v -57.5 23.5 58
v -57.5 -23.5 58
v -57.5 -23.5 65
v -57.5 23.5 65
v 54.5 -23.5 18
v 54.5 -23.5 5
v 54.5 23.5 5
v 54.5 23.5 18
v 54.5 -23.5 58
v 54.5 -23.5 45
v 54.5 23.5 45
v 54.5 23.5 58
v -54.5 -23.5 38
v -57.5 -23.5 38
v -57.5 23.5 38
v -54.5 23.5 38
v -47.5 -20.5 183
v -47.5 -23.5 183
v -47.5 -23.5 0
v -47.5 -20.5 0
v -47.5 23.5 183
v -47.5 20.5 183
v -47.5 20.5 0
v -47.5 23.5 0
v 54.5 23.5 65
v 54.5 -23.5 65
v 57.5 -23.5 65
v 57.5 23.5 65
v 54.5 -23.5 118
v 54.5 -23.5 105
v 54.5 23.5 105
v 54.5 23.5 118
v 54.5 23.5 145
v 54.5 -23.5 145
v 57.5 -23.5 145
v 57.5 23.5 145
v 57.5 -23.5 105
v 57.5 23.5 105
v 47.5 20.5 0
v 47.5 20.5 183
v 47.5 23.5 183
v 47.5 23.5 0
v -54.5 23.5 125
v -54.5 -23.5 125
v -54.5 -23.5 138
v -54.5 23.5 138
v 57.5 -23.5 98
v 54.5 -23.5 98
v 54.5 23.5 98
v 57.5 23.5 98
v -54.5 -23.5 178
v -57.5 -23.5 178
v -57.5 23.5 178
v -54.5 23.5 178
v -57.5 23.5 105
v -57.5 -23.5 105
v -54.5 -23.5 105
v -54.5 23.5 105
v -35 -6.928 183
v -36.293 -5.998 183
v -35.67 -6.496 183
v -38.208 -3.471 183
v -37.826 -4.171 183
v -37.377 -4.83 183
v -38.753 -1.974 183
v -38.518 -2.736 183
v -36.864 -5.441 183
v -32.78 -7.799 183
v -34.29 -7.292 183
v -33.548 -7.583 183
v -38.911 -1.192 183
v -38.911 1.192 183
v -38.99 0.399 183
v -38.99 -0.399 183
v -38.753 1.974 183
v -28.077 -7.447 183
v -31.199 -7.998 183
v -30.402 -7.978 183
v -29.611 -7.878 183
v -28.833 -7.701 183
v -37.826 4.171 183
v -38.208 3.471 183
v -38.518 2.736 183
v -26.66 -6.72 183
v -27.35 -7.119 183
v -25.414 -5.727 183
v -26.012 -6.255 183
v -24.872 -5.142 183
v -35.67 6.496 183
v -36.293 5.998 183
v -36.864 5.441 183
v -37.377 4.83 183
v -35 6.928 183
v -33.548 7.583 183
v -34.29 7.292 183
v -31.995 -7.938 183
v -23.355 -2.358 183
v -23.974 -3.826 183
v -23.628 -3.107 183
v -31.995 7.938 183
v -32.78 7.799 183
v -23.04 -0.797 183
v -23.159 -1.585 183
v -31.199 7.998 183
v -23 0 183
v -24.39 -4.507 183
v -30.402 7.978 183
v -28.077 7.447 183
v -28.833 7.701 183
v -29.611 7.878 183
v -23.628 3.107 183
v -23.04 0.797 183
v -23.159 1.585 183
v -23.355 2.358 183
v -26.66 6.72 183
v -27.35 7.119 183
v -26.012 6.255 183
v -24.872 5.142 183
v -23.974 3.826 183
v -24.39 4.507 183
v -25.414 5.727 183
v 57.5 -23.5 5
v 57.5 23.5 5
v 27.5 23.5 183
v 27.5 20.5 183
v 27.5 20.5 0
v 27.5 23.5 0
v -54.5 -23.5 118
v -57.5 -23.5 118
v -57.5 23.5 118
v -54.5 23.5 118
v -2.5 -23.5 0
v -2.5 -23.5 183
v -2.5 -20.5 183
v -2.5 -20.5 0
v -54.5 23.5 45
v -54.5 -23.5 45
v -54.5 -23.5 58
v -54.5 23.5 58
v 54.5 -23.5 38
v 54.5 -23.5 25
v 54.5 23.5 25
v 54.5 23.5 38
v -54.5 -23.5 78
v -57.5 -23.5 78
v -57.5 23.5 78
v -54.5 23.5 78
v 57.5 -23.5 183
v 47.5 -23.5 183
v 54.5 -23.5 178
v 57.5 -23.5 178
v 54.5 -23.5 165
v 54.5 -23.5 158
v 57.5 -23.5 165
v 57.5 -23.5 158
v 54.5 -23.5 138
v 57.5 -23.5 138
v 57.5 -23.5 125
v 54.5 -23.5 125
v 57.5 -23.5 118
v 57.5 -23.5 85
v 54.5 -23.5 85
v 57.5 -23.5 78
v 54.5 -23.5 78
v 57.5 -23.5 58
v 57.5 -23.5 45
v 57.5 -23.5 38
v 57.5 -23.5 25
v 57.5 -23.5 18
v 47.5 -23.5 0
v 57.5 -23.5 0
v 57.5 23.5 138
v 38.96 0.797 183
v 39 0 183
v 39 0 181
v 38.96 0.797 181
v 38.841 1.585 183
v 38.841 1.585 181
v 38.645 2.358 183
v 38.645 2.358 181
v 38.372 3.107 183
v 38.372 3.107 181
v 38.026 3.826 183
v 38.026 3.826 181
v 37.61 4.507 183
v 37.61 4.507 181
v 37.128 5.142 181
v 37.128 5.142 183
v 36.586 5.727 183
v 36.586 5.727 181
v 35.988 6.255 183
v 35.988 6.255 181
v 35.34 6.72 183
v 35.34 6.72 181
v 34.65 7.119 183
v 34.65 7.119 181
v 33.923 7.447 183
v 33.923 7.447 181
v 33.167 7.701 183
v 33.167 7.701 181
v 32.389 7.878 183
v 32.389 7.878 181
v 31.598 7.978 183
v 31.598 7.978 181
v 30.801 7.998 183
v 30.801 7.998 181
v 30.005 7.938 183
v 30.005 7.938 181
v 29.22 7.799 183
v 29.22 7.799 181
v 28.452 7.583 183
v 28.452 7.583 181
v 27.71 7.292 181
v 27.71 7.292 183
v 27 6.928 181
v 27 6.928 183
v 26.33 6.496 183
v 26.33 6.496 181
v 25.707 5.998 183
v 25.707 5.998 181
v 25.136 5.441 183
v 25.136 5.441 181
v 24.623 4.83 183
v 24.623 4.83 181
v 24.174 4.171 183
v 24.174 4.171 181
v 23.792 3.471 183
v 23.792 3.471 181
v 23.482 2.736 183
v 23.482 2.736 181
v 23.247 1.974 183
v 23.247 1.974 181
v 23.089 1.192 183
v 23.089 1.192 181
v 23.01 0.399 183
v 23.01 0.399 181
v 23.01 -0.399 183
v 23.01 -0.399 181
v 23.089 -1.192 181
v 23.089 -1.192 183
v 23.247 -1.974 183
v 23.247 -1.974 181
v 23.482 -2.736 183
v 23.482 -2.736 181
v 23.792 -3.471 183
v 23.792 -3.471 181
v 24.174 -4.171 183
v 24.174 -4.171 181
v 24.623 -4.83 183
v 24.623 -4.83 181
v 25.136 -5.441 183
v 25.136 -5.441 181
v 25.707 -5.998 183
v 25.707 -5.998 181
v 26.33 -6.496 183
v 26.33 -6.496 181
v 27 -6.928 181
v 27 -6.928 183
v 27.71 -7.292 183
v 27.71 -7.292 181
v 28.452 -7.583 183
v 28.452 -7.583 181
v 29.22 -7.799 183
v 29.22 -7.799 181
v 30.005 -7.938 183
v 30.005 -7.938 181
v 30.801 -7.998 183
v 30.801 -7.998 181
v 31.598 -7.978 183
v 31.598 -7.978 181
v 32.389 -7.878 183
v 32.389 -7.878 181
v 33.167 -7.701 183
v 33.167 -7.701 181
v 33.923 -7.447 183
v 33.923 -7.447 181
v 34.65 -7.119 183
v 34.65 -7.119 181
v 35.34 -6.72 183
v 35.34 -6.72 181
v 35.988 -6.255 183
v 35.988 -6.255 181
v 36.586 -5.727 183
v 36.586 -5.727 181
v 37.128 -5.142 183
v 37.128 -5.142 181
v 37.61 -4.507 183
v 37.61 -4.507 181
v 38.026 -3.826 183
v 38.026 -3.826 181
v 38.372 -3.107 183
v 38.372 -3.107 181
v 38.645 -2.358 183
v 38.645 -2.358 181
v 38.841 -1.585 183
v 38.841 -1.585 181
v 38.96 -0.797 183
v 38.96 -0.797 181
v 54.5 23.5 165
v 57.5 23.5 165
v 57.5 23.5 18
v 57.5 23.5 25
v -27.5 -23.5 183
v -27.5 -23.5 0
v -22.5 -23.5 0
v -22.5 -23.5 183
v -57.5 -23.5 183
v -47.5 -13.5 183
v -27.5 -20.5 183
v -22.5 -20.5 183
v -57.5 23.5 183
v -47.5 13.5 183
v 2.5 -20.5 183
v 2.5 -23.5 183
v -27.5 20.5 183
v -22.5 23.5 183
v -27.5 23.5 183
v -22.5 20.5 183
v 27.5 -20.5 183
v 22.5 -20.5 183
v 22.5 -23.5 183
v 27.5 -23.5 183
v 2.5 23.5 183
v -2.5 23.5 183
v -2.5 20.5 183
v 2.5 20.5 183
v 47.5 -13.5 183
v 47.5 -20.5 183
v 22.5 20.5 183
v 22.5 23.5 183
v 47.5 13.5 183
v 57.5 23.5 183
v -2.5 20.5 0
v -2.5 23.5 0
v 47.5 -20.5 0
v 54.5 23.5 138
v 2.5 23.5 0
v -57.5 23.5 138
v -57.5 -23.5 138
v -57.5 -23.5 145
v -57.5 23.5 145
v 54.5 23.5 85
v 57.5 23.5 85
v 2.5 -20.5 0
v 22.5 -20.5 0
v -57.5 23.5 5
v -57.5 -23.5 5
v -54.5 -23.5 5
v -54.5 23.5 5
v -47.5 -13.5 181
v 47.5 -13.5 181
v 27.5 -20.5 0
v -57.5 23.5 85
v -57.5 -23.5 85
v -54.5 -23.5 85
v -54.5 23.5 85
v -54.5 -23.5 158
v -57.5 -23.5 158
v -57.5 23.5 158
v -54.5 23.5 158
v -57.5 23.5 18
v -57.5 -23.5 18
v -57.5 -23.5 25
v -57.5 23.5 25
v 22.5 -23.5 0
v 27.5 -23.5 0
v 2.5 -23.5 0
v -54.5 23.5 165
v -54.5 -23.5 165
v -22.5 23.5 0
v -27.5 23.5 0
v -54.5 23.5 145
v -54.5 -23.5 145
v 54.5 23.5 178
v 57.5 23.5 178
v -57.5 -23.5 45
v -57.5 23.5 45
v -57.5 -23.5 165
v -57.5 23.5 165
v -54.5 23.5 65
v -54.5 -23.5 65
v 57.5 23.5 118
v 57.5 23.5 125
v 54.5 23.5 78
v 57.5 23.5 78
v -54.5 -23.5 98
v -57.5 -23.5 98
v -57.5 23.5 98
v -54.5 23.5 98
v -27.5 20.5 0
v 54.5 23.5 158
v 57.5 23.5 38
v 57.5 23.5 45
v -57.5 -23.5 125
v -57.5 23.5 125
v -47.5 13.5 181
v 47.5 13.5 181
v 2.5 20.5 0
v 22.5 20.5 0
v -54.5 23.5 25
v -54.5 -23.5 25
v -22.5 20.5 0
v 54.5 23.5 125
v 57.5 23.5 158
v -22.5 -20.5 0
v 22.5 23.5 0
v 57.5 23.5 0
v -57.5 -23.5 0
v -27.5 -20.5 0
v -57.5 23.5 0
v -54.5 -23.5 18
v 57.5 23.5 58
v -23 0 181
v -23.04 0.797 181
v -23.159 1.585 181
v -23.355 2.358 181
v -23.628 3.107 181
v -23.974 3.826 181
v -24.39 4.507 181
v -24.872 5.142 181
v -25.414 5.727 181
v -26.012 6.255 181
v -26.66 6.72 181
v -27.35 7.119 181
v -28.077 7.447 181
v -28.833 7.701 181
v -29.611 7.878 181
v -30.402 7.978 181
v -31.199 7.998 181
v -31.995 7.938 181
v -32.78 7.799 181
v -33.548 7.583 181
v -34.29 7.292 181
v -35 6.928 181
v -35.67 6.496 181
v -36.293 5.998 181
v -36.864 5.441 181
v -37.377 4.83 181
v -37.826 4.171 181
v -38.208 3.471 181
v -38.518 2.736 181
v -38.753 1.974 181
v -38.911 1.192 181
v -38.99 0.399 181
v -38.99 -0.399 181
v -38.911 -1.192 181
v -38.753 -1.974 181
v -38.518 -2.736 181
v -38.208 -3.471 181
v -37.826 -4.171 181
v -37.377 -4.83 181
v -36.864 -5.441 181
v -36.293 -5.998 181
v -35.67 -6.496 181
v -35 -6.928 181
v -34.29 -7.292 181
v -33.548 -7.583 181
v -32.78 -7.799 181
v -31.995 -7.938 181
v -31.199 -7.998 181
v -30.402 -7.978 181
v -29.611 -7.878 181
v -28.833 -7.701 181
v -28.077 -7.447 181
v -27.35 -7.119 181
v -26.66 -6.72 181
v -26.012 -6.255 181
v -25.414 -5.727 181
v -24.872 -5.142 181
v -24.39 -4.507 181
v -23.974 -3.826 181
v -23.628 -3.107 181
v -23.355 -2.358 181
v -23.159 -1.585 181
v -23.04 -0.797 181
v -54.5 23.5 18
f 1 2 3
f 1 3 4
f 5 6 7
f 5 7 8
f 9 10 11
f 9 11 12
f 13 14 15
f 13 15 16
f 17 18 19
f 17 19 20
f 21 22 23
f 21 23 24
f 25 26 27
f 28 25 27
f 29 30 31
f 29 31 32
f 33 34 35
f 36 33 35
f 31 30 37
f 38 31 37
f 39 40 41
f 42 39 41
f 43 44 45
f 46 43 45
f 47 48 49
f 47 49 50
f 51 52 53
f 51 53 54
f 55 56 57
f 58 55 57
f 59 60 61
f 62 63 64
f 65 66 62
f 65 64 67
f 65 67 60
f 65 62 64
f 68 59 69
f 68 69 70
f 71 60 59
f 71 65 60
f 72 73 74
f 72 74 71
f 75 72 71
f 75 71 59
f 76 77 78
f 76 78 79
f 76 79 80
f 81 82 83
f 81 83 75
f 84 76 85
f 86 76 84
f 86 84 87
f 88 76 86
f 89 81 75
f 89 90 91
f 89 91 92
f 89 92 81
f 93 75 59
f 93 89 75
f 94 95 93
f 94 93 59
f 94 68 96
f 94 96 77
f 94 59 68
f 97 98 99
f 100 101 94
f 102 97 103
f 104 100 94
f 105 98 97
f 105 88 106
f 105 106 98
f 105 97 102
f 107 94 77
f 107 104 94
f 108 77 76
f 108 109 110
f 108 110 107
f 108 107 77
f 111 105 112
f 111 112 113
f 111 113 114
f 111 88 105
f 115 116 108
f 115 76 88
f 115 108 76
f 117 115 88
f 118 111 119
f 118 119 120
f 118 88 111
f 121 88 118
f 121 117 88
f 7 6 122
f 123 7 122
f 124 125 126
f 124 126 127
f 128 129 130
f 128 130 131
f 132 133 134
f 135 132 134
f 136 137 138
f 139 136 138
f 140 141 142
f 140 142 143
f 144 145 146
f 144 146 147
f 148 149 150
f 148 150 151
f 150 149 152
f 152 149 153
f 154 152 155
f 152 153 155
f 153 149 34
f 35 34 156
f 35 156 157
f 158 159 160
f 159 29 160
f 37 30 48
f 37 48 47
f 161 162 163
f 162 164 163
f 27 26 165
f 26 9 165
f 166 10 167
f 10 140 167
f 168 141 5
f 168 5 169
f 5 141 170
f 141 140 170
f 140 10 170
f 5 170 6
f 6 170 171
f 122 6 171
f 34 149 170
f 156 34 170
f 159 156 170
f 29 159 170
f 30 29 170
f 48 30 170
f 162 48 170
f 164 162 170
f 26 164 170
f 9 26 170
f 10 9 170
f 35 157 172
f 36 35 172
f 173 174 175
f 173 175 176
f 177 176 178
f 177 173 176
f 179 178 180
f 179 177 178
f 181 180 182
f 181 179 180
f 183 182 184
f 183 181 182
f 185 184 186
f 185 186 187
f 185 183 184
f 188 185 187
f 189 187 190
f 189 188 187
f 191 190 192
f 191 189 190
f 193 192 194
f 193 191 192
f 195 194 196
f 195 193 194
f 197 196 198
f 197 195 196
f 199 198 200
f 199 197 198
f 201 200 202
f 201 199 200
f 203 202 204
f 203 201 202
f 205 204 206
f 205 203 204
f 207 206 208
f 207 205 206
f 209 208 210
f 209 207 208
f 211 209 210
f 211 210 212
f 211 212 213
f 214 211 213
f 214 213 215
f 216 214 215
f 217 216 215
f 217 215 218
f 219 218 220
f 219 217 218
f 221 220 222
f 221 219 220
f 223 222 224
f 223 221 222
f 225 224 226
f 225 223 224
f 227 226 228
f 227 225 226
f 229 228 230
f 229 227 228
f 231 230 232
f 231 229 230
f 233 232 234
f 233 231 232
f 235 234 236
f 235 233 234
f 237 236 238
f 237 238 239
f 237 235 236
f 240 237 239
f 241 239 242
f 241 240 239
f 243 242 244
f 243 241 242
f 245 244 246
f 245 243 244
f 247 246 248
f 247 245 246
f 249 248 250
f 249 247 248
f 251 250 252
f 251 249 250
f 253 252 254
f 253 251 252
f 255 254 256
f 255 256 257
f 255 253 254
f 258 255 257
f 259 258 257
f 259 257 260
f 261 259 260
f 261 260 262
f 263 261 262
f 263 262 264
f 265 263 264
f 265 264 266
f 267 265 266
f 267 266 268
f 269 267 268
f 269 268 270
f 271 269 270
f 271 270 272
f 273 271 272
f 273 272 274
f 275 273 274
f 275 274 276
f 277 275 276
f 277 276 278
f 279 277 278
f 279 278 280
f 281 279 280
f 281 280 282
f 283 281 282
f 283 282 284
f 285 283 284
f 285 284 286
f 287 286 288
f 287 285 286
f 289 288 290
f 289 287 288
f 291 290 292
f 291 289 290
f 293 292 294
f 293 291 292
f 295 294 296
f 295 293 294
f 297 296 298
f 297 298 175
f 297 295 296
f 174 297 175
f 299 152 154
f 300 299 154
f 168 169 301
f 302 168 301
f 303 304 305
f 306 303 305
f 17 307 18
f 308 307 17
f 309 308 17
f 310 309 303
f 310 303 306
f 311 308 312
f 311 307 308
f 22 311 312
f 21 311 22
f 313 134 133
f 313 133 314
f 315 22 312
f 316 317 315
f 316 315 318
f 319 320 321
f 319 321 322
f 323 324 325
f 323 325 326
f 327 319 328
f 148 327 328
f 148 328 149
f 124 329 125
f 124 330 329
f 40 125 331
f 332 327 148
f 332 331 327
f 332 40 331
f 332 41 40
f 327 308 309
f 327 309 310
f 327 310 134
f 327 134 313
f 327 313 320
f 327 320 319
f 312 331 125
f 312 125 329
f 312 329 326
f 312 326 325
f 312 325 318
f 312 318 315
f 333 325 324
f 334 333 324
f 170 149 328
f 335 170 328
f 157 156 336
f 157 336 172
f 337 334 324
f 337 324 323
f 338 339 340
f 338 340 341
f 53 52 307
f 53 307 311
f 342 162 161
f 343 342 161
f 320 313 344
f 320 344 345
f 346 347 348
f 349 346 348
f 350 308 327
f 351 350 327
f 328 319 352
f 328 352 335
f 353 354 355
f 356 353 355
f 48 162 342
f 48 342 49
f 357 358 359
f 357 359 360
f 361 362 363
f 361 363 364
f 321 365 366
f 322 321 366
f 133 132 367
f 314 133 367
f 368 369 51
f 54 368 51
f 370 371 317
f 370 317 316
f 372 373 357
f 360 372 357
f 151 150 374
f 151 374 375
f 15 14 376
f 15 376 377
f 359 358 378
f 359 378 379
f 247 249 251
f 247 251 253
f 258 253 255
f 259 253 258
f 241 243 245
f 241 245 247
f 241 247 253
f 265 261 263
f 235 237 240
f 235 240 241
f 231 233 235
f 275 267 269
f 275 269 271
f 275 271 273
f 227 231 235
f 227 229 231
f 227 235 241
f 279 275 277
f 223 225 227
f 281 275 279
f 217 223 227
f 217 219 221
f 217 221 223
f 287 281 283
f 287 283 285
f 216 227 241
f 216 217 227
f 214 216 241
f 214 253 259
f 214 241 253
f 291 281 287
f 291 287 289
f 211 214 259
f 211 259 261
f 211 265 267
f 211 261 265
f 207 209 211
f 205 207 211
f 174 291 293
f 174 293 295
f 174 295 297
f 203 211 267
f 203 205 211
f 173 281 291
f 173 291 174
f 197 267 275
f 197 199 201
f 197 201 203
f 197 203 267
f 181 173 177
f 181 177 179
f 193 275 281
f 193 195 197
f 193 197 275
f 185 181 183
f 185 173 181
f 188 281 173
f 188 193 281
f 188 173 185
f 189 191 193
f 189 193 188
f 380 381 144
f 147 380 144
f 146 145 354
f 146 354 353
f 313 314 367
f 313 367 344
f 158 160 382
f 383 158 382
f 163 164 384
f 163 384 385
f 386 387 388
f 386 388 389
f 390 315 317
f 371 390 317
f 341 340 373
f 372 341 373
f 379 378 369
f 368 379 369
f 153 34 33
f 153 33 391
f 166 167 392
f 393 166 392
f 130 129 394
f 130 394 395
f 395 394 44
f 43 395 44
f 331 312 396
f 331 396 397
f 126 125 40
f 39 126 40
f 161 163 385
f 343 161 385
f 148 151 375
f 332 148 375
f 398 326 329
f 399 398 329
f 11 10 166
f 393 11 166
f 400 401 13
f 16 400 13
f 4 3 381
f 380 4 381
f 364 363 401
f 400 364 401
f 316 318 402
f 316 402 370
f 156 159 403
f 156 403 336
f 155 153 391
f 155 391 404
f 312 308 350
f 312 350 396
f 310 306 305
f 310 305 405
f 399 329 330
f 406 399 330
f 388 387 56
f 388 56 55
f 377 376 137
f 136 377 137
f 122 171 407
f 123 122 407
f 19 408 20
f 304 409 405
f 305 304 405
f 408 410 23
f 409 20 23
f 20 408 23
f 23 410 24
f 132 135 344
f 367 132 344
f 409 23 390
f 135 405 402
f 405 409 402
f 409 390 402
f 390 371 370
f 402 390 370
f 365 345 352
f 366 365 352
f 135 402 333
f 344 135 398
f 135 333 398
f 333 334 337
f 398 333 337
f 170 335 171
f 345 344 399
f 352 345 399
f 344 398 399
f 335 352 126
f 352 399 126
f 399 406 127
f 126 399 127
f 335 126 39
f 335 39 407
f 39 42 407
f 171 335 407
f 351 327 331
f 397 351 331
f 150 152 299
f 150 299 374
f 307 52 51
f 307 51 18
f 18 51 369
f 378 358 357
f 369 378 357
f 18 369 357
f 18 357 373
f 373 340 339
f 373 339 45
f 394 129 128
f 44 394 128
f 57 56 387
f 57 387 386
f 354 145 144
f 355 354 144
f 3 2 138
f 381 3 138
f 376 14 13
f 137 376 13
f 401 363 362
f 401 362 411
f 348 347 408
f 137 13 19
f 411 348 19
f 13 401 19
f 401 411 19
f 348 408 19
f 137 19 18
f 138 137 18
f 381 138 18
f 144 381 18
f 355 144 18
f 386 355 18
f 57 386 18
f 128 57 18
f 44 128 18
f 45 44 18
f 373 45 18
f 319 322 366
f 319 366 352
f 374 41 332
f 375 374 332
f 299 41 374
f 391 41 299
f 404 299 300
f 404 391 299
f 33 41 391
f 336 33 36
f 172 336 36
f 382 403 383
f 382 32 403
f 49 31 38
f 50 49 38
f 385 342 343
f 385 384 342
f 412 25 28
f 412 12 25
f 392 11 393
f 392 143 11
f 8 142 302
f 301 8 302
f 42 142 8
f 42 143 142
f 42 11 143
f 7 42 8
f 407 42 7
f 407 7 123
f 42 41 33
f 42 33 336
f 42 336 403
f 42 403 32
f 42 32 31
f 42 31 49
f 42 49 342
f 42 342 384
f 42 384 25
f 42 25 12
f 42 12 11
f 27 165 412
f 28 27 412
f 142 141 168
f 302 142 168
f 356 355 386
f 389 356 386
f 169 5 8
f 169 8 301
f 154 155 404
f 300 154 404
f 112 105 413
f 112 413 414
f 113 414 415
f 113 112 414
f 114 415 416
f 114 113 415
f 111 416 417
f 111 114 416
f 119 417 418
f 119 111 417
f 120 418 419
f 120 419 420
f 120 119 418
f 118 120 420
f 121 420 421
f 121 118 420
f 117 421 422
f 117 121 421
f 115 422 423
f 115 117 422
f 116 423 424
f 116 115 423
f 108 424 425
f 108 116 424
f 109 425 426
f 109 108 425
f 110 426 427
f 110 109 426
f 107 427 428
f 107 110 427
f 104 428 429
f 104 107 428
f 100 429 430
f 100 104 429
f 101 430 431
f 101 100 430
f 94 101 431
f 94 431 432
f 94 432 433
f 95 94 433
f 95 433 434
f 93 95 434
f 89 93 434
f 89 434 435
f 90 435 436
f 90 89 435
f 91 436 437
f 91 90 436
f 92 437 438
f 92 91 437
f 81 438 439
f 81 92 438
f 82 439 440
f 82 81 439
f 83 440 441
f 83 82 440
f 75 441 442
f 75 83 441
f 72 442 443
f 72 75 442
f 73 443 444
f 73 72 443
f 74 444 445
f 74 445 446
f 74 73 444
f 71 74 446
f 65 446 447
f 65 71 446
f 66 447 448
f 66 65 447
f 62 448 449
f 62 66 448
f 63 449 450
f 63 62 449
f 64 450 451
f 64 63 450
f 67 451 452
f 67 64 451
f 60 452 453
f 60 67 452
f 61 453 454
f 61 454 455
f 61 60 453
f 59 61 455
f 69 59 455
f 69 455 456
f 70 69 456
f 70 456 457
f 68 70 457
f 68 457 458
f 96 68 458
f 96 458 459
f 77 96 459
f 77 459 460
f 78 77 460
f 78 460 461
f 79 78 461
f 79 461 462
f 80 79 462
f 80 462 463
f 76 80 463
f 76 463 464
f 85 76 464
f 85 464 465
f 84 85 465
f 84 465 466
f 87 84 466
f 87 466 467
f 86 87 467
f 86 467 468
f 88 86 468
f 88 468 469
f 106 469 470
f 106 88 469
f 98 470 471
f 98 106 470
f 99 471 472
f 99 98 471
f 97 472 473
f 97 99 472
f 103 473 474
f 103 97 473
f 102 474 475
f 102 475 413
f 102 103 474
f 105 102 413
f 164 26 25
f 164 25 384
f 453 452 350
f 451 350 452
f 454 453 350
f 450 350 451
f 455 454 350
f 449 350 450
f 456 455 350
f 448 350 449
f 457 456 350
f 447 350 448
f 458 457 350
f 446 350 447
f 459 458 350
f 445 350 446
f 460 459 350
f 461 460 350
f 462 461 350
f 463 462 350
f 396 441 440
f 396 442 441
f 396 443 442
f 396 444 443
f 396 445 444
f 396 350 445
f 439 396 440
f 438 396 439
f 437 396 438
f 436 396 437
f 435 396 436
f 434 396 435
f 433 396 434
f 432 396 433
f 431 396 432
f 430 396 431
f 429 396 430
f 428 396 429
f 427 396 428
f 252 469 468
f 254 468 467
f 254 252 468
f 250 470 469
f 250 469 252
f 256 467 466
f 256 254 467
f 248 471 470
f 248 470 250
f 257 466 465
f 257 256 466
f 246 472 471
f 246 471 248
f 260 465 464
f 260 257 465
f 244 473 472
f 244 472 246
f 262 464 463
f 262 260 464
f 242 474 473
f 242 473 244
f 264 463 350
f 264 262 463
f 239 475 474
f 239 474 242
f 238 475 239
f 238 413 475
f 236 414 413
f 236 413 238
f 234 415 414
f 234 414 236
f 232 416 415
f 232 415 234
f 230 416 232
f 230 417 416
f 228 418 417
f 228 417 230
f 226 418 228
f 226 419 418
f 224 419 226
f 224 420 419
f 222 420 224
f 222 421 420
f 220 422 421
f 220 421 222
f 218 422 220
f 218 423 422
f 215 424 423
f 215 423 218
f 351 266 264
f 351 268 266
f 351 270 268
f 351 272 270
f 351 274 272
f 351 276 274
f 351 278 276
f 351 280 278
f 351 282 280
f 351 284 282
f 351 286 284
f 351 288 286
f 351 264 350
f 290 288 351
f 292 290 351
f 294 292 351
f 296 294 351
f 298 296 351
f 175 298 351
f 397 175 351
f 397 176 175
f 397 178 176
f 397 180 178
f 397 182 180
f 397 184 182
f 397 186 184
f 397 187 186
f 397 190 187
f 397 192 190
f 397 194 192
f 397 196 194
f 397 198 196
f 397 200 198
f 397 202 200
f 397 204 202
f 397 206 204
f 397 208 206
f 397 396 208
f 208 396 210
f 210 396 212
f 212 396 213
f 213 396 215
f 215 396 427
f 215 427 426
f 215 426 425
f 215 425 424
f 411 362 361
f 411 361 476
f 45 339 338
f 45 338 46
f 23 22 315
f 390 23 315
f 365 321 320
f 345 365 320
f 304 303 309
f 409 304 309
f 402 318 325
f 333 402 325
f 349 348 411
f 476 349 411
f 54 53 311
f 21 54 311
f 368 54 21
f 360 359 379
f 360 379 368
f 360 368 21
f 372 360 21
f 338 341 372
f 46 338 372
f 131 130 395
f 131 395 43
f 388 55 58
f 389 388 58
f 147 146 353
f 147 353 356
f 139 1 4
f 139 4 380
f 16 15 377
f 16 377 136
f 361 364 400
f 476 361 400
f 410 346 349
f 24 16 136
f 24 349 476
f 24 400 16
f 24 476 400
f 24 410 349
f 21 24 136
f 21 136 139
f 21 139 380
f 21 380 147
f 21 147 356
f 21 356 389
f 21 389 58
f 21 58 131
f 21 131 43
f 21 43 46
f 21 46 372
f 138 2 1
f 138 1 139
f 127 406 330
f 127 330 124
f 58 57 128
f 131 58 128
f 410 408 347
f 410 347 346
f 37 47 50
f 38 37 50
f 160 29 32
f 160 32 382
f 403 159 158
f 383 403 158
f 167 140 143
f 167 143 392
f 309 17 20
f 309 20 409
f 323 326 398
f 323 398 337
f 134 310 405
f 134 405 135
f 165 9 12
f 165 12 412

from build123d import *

# Parameters (mm, degrees)
F0_W     = 115
F0_H     = 47
F1_DEPTH = 183
F2_W     = 95
F2_H     = 27
F2_R     = 8
F3_DEPTH = 2
F4_W     = 20
F4_H     = 3
F5_DEPTH = 183.001
F6_W     = 3
F6_H     = 13
F7_DEPTH = 47.001


with BuildPart() as f1:
    # F0 (on Top) → F1 (new body)
    with BuildSketch(Plane.XY):
        Rectangle(F0_W, F0_H)
    extrude(amount=F1_DEPTH)

    # F2 (on face) → F3 (cut)
    with BuildSketch(Plane.XY.offset(183)):
        Rectangle(F2_W, F2_H)
        with Locations((-31, 0)):
            Circle(F2_R, mode=Mode.SUBTRACT)
        with Locations((31, 0)):
            Circle(F2_R, mode=Mode.SUBTRACT)
    extrude(amount=-F3_DEPTH, mode=Mode.SUBTRACT)

    # F4 (on face) → F5 (cut, through all)
    with BuildSketch(Plane.XY.offset(183)):
        with Locations((-37.5, 22)):
            Rectangle(F4_W, F4_H)
        with Locations((-12.5, 22)):
            Rectangle(F4_W, F4_H)
        with Locations((12.5, 22)):
            Rectangle(F4_W, F4_H)
        with Locations((37.5, 22)):
            Rectangle(F4_W, F4_H)
        with Locations((37.5, -22)):
            Rectangle(F4_W, F4_H)
        with Locations((12.5, -22)):
            Rectangle(F4_W, F4_H)
        with Locations((-12.5, -22)):
            Rectangle(F4_W, F4_H)
        with Locations((-37.5, -22)):
            Rectangle(F4_W, F4_H)
    extrude(amount=-F5_DEPTH, mode=Mode.SUBTRACT)

    # F6 (on face) → F7 (cut, through all)
    with BuildSketch(Plane.XZ.offset(23.5)):
        with Locations((-56, 171.5)):
            Rectangle(F6_W, F6_H)
        with Locations((-56, 151.5)):
            Rectangle(F6_W, F6_H)
        with Locations((-56, 131.5)):
            Rectangle(F6_W, F6_H)
        with Locations((-56, 111.5)):
            Rectangle(F6_W, F6_H)
        with Locations((-56, 91.5)):
            Rectangle(F6_W, F6_H)
        with Locations((-56, 71.5)):
            Rectangle(F6_W, F6_H)
        with Locations((-56, 51.5)):
            Rectangle(F6_W, F6_H)
        with Locations((-56, 31.5)):
            Rectangle(F6_W, F6_H)
        with Locations((-56, 11.5)):
            Rectangle(F6_W, F6_H)
        with Locations((56, 171.5)):
            Rectangle(F6_W, F6_H)
        with Locations((56, 151.5)):
            Rectangle(F6_W, F6_H)
        with Locations((56, 131.5)):
            Rectangle(F6_W, F6_H)
        with Locations((56, 111.5)):
            Rectangle(F6_W, F6_H)
        with Locations((56, 91.5)):
            Rectangle(F6_W, F6_H)
        with Locations((56, 11.5)):
            Rectangle(F6_W, F6_H)
        with Locations((56, 51.5)):
            Rectangle(F6_W, F6_H)
        with Locations((56, 71.5)):
            Rectangle(F6_W, F6_H)
        with Locations((56, 31.5)):
            Rectangle(F6_W, F6_H)
    extrude(amount=-F7_DEPTH, mode=Mode.SUBTRACT)


solid = f1.part
